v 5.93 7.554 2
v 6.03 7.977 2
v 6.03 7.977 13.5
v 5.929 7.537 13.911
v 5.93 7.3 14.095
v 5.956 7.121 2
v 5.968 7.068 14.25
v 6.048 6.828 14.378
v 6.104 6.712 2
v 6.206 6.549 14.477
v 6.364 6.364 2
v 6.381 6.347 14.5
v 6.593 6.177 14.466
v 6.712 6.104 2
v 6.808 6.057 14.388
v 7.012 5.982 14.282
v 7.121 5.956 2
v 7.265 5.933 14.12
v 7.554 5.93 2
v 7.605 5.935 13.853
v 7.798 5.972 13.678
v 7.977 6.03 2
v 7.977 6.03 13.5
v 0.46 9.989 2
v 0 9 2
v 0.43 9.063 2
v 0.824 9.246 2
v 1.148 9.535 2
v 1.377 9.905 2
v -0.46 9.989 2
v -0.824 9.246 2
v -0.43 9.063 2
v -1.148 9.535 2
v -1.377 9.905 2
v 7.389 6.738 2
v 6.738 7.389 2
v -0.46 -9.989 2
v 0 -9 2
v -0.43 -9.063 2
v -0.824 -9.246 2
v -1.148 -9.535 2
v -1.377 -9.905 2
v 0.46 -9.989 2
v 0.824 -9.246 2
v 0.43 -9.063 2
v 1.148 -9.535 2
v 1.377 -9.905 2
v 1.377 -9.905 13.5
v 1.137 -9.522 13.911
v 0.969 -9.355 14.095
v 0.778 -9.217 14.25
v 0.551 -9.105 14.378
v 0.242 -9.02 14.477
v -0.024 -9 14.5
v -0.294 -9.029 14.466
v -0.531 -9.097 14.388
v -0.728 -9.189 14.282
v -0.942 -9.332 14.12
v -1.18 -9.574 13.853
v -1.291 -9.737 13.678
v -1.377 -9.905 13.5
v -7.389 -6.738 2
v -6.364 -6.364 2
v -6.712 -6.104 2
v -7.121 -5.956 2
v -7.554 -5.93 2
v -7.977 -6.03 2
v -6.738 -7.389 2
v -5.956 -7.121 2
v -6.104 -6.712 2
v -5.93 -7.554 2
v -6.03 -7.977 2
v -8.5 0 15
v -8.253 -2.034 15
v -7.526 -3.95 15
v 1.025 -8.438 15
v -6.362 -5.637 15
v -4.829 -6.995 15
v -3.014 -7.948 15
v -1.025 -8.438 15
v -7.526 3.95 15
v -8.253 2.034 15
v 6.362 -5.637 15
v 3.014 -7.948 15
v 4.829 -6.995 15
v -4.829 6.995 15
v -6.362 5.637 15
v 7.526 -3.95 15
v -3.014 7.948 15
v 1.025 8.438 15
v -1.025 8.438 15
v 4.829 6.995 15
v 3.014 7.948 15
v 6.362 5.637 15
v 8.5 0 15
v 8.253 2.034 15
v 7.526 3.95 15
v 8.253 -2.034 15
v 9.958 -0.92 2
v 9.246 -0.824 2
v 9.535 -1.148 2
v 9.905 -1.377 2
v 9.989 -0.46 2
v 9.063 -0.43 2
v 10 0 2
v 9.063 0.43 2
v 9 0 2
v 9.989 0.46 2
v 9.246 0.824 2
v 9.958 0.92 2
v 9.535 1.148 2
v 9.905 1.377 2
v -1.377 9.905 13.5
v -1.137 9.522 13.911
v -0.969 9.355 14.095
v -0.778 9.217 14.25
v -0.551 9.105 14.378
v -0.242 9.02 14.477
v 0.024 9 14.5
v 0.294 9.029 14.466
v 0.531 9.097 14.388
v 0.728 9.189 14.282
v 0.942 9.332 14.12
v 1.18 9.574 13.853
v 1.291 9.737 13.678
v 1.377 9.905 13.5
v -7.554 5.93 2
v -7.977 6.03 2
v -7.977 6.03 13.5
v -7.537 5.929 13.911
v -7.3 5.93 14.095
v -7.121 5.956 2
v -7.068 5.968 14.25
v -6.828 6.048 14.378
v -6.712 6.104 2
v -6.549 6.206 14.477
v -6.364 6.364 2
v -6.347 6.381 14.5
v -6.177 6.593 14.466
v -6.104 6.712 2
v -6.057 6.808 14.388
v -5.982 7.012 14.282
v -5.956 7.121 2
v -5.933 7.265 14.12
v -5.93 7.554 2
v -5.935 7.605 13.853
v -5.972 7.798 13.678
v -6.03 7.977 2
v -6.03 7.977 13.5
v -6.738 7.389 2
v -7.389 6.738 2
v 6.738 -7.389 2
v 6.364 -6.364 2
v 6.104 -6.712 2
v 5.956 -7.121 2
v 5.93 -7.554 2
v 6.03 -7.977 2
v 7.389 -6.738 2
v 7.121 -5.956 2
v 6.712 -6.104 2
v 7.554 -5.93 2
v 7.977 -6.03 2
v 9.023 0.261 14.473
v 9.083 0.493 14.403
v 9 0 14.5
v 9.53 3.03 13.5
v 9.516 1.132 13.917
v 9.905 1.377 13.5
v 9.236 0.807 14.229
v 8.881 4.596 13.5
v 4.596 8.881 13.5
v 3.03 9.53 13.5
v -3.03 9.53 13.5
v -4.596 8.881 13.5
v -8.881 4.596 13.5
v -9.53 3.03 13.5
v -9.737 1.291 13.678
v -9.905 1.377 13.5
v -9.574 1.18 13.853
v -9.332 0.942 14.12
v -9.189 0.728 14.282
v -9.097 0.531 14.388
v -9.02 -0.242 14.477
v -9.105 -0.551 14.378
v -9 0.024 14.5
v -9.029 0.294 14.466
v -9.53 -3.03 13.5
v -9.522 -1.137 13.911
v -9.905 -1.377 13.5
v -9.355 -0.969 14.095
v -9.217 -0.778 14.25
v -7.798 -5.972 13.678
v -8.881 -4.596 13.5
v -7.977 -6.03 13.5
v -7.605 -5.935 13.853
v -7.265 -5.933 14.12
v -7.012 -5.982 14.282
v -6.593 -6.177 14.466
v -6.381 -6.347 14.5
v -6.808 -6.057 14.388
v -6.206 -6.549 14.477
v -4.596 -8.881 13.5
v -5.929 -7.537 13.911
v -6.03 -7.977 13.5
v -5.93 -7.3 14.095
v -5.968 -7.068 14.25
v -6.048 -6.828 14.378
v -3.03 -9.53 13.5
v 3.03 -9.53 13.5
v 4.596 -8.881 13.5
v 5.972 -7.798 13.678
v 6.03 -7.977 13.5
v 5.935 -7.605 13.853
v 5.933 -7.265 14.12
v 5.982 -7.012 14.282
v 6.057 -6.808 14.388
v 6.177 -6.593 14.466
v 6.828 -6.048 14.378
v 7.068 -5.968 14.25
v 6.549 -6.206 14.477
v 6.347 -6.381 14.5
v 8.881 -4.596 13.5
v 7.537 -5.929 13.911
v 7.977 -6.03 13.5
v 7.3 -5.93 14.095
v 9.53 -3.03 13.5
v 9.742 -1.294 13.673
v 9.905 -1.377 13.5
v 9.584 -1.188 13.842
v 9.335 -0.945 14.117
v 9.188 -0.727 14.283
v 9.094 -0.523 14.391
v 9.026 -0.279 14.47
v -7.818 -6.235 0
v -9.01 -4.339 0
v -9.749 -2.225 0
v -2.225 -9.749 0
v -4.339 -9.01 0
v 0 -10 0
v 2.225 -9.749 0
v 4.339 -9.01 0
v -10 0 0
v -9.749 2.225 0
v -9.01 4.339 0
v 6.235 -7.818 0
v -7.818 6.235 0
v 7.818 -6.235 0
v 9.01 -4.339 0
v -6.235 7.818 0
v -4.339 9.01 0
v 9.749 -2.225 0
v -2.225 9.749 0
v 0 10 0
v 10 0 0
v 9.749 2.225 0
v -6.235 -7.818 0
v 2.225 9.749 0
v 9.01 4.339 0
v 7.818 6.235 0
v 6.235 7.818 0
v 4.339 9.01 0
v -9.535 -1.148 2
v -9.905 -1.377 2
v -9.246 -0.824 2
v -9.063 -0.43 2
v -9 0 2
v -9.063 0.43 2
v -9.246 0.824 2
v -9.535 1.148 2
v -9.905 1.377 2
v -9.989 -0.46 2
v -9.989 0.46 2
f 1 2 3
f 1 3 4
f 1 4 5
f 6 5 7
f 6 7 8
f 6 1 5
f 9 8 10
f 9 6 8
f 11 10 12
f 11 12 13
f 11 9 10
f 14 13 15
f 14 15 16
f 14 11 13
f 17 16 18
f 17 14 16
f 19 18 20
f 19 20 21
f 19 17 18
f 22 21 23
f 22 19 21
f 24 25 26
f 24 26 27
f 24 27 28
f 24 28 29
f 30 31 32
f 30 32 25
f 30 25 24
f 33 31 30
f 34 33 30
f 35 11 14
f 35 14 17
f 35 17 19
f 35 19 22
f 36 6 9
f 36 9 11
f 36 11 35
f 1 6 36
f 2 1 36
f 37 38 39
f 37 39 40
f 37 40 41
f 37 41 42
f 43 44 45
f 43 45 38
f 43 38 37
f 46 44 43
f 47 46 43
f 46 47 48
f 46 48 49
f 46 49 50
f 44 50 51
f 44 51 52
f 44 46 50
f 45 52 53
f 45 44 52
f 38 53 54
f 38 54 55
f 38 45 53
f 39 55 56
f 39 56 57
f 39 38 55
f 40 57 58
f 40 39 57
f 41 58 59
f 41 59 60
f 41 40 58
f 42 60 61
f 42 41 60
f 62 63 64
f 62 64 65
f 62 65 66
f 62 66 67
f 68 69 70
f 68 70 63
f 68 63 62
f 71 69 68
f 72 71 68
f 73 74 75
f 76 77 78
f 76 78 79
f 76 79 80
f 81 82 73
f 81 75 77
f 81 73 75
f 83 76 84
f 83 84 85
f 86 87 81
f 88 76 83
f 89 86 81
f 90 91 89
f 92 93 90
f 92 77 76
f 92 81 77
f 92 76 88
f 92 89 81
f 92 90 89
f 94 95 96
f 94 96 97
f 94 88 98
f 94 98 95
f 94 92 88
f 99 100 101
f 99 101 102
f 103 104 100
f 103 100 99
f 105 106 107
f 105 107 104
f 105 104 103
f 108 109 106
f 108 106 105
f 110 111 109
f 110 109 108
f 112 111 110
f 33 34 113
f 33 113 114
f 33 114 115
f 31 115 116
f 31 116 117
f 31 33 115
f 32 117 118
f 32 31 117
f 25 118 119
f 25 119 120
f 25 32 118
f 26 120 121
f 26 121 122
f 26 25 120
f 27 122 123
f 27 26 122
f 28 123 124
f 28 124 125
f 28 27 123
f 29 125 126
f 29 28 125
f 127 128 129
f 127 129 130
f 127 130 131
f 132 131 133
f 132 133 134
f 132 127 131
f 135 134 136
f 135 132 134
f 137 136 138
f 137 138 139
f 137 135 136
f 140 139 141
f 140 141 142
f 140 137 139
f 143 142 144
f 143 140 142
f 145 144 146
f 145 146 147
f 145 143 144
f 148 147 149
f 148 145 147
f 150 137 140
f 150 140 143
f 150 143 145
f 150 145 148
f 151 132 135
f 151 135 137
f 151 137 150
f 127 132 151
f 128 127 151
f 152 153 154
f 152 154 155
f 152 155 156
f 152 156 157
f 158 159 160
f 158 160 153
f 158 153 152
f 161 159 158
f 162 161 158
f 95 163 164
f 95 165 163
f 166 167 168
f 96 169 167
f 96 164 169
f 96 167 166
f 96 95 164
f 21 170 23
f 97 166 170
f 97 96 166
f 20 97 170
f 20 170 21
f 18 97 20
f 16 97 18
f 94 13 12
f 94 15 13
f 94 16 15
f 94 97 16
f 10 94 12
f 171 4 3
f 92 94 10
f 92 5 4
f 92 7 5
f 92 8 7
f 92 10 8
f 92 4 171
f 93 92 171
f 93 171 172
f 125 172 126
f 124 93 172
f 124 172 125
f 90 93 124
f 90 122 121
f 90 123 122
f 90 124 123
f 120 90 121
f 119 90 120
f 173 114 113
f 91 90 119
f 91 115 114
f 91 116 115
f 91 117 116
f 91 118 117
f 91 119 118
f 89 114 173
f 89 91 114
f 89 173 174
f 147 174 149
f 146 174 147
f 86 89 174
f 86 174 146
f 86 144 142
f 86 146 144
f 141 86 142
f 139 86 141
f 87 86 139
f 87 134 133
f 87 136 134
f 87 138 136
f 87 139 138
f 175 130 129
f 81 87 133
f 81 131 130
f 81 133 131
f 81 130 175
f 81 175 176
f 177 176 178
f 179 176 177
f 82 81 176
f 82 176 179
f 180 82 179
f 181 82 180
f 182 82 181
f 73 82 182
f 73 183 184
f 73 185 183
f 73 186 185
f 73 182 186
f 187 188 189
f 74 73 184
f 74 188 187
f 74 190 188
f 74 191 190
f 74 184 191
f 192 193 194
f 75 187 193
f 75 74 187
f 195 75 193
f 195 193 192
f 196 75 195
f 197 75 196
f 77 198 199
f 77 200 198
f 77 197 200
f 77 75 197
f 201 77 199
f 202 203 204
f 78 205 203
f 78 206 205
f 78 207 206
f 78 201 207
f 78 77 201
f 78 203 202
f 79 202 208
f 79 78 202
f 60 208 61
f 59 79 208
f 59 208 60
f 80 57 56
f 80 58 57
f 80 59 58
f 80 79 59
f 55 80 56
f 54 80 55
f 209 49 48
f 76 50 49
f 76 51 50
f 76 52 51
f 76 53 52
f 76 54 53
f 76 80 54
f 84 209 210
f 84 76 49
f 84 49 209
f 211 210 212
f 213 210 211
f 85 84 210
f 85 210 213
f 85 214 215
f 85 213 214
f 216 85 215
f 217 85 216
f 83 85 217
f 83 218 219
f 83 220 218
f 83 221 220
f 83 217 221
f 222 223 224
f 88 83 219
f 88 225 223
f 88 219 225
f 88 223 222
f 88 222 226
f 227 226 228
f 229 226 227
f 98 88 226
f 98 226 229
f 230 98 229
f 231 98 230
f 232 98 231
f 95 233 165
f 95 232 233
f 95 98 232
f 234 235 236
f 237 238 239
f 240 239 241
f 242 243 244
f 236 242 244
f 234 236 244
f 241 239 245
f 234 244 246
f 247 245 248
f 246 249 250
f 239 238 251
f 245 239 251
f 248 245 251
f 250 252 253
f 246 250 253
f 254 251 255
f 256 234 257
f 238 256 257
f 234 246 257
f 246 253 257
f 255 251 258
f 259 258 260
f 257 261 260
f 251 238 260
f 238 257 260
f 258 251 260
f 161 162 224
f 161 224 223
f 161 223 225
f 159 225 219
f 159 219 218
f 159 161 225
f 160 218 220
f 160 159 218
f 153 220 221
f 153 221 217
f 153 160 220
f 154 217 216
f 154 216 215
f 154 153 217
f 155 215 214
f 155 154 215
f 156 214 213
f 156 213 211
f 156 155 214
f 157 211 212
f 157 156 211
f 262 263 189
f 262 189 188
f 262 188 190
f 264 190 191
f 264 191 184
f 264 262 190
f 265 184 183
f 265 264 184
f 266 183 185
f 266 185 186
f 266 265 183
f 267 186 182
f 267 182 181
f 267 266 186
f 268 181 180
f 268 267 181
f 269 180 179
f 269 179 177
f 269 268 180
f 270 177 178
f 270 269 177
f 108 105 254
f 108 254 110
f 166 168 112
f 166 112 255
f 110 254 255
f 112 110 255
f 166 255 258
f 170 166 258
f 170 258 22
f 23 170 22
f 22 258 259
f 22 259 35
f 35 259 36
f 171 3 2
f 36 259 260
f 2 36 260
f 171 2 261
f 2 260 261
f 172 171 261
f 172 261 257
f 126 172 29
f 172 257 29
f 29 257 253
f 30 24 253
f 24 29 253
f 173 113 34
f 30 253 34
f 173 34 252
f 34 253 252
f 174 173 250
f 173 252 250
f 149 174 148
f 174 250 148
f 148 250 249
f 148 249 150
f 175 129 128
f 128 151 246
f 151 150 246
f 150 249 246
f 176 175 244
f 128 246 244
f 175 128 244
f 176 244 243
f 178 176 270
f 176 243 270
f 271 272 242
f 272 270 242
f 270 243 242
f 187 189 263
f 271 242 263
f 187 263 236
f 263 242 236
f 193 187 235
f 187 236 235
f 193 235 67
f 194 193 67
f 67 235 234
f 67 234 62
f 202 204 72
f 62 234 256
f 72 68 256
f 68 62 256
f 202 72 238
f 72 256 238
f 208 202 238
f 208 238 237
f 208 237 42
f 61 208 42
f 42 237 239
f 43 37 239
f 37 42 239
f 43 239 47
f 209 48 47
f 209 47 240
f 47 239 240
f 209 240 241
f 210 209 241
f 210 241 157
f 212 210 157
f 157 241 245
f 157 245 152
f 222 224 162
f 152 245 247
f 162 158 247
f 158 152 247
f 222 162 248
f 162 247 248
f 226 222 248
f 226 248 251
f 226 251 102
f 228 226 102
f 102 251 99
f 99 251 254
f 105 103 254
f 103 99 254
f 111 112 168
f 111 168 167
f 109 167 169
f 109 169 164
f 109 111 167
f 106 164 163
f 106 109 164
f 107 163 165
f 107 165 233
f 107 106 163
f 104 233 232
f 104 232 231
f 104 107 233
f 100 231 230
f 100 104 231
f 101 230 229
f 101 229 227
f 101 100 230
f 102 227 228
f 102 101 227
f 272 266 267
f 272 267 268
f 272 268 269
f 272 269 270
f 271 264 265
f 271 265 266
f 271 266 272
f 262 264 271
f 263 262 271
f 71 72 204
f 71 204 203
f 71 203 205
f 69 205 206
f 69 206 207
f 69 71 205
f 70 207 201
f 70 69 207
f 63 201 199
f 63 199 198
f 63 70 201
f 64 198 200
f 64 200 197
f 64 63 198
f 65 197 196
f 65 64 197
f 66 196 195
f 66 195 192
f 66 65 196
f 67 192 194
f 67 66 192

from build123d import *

# Parameters (mm, degrees)
CYLINDER001_R     = 1.5
CYLINDER001_DEPTH = 17
ARRAY_COUNT       = 8
CYLINDER_R        = 10
CYLINDER_DEPTH    = 15
CHAMFER_SIZE      = 1.5


with BuildPart() as array_hendiduras:
    # Cylinder001 → Cylinder001 (new body)
    with BuildSketch(Plane(origin=(10.5, 0, 3), x_dir=(1, 0, 0), z_dir=(0, 0, 1))):
        Circle(CYLINDER001_R)
    extrude(amount=CYLINDER001_DEPTH)

    # Array: Array_hendiduras ×8 about axis
    array_axis = Axis((0, 0, 0), (0, 0, 1))


with BuildPart() as array_hendiduras_1:
    add(array_hendiduras.part)
    for i in range(1, ARRAY_COUNT):
        add(array_hendiduras.part.rotate(array_axis, i * 360 / ARRAY_COUNT))


with BuildPart() as array_hendiduras_2:
    # Array placement: moved
    add(array_hendiduras_1.part.moved(Location((0, 0, -1))))


with BuildPart() as boton_acabado:
    # Cylinder → Cylinder (new body)
    with BuildSketch(Plane.XY):
        Circle(CYLINDER_R)
    extrude(amount=CYLINDER_DEPTH)

    # Chamfer
    chamfer_edges = [boton_acabado.edges().sort_by_distance(p)[0] for p in [
        (-10, 0, 15),
    ]]
    chamfer(chamfer_edges, length=CHAMFER_SIZE)

    # Cut: cut Array_hendiduras
    add(array_hendiduras_2.part, mode=Mode.SUBTRACT)


solid = boton_acabado.part
